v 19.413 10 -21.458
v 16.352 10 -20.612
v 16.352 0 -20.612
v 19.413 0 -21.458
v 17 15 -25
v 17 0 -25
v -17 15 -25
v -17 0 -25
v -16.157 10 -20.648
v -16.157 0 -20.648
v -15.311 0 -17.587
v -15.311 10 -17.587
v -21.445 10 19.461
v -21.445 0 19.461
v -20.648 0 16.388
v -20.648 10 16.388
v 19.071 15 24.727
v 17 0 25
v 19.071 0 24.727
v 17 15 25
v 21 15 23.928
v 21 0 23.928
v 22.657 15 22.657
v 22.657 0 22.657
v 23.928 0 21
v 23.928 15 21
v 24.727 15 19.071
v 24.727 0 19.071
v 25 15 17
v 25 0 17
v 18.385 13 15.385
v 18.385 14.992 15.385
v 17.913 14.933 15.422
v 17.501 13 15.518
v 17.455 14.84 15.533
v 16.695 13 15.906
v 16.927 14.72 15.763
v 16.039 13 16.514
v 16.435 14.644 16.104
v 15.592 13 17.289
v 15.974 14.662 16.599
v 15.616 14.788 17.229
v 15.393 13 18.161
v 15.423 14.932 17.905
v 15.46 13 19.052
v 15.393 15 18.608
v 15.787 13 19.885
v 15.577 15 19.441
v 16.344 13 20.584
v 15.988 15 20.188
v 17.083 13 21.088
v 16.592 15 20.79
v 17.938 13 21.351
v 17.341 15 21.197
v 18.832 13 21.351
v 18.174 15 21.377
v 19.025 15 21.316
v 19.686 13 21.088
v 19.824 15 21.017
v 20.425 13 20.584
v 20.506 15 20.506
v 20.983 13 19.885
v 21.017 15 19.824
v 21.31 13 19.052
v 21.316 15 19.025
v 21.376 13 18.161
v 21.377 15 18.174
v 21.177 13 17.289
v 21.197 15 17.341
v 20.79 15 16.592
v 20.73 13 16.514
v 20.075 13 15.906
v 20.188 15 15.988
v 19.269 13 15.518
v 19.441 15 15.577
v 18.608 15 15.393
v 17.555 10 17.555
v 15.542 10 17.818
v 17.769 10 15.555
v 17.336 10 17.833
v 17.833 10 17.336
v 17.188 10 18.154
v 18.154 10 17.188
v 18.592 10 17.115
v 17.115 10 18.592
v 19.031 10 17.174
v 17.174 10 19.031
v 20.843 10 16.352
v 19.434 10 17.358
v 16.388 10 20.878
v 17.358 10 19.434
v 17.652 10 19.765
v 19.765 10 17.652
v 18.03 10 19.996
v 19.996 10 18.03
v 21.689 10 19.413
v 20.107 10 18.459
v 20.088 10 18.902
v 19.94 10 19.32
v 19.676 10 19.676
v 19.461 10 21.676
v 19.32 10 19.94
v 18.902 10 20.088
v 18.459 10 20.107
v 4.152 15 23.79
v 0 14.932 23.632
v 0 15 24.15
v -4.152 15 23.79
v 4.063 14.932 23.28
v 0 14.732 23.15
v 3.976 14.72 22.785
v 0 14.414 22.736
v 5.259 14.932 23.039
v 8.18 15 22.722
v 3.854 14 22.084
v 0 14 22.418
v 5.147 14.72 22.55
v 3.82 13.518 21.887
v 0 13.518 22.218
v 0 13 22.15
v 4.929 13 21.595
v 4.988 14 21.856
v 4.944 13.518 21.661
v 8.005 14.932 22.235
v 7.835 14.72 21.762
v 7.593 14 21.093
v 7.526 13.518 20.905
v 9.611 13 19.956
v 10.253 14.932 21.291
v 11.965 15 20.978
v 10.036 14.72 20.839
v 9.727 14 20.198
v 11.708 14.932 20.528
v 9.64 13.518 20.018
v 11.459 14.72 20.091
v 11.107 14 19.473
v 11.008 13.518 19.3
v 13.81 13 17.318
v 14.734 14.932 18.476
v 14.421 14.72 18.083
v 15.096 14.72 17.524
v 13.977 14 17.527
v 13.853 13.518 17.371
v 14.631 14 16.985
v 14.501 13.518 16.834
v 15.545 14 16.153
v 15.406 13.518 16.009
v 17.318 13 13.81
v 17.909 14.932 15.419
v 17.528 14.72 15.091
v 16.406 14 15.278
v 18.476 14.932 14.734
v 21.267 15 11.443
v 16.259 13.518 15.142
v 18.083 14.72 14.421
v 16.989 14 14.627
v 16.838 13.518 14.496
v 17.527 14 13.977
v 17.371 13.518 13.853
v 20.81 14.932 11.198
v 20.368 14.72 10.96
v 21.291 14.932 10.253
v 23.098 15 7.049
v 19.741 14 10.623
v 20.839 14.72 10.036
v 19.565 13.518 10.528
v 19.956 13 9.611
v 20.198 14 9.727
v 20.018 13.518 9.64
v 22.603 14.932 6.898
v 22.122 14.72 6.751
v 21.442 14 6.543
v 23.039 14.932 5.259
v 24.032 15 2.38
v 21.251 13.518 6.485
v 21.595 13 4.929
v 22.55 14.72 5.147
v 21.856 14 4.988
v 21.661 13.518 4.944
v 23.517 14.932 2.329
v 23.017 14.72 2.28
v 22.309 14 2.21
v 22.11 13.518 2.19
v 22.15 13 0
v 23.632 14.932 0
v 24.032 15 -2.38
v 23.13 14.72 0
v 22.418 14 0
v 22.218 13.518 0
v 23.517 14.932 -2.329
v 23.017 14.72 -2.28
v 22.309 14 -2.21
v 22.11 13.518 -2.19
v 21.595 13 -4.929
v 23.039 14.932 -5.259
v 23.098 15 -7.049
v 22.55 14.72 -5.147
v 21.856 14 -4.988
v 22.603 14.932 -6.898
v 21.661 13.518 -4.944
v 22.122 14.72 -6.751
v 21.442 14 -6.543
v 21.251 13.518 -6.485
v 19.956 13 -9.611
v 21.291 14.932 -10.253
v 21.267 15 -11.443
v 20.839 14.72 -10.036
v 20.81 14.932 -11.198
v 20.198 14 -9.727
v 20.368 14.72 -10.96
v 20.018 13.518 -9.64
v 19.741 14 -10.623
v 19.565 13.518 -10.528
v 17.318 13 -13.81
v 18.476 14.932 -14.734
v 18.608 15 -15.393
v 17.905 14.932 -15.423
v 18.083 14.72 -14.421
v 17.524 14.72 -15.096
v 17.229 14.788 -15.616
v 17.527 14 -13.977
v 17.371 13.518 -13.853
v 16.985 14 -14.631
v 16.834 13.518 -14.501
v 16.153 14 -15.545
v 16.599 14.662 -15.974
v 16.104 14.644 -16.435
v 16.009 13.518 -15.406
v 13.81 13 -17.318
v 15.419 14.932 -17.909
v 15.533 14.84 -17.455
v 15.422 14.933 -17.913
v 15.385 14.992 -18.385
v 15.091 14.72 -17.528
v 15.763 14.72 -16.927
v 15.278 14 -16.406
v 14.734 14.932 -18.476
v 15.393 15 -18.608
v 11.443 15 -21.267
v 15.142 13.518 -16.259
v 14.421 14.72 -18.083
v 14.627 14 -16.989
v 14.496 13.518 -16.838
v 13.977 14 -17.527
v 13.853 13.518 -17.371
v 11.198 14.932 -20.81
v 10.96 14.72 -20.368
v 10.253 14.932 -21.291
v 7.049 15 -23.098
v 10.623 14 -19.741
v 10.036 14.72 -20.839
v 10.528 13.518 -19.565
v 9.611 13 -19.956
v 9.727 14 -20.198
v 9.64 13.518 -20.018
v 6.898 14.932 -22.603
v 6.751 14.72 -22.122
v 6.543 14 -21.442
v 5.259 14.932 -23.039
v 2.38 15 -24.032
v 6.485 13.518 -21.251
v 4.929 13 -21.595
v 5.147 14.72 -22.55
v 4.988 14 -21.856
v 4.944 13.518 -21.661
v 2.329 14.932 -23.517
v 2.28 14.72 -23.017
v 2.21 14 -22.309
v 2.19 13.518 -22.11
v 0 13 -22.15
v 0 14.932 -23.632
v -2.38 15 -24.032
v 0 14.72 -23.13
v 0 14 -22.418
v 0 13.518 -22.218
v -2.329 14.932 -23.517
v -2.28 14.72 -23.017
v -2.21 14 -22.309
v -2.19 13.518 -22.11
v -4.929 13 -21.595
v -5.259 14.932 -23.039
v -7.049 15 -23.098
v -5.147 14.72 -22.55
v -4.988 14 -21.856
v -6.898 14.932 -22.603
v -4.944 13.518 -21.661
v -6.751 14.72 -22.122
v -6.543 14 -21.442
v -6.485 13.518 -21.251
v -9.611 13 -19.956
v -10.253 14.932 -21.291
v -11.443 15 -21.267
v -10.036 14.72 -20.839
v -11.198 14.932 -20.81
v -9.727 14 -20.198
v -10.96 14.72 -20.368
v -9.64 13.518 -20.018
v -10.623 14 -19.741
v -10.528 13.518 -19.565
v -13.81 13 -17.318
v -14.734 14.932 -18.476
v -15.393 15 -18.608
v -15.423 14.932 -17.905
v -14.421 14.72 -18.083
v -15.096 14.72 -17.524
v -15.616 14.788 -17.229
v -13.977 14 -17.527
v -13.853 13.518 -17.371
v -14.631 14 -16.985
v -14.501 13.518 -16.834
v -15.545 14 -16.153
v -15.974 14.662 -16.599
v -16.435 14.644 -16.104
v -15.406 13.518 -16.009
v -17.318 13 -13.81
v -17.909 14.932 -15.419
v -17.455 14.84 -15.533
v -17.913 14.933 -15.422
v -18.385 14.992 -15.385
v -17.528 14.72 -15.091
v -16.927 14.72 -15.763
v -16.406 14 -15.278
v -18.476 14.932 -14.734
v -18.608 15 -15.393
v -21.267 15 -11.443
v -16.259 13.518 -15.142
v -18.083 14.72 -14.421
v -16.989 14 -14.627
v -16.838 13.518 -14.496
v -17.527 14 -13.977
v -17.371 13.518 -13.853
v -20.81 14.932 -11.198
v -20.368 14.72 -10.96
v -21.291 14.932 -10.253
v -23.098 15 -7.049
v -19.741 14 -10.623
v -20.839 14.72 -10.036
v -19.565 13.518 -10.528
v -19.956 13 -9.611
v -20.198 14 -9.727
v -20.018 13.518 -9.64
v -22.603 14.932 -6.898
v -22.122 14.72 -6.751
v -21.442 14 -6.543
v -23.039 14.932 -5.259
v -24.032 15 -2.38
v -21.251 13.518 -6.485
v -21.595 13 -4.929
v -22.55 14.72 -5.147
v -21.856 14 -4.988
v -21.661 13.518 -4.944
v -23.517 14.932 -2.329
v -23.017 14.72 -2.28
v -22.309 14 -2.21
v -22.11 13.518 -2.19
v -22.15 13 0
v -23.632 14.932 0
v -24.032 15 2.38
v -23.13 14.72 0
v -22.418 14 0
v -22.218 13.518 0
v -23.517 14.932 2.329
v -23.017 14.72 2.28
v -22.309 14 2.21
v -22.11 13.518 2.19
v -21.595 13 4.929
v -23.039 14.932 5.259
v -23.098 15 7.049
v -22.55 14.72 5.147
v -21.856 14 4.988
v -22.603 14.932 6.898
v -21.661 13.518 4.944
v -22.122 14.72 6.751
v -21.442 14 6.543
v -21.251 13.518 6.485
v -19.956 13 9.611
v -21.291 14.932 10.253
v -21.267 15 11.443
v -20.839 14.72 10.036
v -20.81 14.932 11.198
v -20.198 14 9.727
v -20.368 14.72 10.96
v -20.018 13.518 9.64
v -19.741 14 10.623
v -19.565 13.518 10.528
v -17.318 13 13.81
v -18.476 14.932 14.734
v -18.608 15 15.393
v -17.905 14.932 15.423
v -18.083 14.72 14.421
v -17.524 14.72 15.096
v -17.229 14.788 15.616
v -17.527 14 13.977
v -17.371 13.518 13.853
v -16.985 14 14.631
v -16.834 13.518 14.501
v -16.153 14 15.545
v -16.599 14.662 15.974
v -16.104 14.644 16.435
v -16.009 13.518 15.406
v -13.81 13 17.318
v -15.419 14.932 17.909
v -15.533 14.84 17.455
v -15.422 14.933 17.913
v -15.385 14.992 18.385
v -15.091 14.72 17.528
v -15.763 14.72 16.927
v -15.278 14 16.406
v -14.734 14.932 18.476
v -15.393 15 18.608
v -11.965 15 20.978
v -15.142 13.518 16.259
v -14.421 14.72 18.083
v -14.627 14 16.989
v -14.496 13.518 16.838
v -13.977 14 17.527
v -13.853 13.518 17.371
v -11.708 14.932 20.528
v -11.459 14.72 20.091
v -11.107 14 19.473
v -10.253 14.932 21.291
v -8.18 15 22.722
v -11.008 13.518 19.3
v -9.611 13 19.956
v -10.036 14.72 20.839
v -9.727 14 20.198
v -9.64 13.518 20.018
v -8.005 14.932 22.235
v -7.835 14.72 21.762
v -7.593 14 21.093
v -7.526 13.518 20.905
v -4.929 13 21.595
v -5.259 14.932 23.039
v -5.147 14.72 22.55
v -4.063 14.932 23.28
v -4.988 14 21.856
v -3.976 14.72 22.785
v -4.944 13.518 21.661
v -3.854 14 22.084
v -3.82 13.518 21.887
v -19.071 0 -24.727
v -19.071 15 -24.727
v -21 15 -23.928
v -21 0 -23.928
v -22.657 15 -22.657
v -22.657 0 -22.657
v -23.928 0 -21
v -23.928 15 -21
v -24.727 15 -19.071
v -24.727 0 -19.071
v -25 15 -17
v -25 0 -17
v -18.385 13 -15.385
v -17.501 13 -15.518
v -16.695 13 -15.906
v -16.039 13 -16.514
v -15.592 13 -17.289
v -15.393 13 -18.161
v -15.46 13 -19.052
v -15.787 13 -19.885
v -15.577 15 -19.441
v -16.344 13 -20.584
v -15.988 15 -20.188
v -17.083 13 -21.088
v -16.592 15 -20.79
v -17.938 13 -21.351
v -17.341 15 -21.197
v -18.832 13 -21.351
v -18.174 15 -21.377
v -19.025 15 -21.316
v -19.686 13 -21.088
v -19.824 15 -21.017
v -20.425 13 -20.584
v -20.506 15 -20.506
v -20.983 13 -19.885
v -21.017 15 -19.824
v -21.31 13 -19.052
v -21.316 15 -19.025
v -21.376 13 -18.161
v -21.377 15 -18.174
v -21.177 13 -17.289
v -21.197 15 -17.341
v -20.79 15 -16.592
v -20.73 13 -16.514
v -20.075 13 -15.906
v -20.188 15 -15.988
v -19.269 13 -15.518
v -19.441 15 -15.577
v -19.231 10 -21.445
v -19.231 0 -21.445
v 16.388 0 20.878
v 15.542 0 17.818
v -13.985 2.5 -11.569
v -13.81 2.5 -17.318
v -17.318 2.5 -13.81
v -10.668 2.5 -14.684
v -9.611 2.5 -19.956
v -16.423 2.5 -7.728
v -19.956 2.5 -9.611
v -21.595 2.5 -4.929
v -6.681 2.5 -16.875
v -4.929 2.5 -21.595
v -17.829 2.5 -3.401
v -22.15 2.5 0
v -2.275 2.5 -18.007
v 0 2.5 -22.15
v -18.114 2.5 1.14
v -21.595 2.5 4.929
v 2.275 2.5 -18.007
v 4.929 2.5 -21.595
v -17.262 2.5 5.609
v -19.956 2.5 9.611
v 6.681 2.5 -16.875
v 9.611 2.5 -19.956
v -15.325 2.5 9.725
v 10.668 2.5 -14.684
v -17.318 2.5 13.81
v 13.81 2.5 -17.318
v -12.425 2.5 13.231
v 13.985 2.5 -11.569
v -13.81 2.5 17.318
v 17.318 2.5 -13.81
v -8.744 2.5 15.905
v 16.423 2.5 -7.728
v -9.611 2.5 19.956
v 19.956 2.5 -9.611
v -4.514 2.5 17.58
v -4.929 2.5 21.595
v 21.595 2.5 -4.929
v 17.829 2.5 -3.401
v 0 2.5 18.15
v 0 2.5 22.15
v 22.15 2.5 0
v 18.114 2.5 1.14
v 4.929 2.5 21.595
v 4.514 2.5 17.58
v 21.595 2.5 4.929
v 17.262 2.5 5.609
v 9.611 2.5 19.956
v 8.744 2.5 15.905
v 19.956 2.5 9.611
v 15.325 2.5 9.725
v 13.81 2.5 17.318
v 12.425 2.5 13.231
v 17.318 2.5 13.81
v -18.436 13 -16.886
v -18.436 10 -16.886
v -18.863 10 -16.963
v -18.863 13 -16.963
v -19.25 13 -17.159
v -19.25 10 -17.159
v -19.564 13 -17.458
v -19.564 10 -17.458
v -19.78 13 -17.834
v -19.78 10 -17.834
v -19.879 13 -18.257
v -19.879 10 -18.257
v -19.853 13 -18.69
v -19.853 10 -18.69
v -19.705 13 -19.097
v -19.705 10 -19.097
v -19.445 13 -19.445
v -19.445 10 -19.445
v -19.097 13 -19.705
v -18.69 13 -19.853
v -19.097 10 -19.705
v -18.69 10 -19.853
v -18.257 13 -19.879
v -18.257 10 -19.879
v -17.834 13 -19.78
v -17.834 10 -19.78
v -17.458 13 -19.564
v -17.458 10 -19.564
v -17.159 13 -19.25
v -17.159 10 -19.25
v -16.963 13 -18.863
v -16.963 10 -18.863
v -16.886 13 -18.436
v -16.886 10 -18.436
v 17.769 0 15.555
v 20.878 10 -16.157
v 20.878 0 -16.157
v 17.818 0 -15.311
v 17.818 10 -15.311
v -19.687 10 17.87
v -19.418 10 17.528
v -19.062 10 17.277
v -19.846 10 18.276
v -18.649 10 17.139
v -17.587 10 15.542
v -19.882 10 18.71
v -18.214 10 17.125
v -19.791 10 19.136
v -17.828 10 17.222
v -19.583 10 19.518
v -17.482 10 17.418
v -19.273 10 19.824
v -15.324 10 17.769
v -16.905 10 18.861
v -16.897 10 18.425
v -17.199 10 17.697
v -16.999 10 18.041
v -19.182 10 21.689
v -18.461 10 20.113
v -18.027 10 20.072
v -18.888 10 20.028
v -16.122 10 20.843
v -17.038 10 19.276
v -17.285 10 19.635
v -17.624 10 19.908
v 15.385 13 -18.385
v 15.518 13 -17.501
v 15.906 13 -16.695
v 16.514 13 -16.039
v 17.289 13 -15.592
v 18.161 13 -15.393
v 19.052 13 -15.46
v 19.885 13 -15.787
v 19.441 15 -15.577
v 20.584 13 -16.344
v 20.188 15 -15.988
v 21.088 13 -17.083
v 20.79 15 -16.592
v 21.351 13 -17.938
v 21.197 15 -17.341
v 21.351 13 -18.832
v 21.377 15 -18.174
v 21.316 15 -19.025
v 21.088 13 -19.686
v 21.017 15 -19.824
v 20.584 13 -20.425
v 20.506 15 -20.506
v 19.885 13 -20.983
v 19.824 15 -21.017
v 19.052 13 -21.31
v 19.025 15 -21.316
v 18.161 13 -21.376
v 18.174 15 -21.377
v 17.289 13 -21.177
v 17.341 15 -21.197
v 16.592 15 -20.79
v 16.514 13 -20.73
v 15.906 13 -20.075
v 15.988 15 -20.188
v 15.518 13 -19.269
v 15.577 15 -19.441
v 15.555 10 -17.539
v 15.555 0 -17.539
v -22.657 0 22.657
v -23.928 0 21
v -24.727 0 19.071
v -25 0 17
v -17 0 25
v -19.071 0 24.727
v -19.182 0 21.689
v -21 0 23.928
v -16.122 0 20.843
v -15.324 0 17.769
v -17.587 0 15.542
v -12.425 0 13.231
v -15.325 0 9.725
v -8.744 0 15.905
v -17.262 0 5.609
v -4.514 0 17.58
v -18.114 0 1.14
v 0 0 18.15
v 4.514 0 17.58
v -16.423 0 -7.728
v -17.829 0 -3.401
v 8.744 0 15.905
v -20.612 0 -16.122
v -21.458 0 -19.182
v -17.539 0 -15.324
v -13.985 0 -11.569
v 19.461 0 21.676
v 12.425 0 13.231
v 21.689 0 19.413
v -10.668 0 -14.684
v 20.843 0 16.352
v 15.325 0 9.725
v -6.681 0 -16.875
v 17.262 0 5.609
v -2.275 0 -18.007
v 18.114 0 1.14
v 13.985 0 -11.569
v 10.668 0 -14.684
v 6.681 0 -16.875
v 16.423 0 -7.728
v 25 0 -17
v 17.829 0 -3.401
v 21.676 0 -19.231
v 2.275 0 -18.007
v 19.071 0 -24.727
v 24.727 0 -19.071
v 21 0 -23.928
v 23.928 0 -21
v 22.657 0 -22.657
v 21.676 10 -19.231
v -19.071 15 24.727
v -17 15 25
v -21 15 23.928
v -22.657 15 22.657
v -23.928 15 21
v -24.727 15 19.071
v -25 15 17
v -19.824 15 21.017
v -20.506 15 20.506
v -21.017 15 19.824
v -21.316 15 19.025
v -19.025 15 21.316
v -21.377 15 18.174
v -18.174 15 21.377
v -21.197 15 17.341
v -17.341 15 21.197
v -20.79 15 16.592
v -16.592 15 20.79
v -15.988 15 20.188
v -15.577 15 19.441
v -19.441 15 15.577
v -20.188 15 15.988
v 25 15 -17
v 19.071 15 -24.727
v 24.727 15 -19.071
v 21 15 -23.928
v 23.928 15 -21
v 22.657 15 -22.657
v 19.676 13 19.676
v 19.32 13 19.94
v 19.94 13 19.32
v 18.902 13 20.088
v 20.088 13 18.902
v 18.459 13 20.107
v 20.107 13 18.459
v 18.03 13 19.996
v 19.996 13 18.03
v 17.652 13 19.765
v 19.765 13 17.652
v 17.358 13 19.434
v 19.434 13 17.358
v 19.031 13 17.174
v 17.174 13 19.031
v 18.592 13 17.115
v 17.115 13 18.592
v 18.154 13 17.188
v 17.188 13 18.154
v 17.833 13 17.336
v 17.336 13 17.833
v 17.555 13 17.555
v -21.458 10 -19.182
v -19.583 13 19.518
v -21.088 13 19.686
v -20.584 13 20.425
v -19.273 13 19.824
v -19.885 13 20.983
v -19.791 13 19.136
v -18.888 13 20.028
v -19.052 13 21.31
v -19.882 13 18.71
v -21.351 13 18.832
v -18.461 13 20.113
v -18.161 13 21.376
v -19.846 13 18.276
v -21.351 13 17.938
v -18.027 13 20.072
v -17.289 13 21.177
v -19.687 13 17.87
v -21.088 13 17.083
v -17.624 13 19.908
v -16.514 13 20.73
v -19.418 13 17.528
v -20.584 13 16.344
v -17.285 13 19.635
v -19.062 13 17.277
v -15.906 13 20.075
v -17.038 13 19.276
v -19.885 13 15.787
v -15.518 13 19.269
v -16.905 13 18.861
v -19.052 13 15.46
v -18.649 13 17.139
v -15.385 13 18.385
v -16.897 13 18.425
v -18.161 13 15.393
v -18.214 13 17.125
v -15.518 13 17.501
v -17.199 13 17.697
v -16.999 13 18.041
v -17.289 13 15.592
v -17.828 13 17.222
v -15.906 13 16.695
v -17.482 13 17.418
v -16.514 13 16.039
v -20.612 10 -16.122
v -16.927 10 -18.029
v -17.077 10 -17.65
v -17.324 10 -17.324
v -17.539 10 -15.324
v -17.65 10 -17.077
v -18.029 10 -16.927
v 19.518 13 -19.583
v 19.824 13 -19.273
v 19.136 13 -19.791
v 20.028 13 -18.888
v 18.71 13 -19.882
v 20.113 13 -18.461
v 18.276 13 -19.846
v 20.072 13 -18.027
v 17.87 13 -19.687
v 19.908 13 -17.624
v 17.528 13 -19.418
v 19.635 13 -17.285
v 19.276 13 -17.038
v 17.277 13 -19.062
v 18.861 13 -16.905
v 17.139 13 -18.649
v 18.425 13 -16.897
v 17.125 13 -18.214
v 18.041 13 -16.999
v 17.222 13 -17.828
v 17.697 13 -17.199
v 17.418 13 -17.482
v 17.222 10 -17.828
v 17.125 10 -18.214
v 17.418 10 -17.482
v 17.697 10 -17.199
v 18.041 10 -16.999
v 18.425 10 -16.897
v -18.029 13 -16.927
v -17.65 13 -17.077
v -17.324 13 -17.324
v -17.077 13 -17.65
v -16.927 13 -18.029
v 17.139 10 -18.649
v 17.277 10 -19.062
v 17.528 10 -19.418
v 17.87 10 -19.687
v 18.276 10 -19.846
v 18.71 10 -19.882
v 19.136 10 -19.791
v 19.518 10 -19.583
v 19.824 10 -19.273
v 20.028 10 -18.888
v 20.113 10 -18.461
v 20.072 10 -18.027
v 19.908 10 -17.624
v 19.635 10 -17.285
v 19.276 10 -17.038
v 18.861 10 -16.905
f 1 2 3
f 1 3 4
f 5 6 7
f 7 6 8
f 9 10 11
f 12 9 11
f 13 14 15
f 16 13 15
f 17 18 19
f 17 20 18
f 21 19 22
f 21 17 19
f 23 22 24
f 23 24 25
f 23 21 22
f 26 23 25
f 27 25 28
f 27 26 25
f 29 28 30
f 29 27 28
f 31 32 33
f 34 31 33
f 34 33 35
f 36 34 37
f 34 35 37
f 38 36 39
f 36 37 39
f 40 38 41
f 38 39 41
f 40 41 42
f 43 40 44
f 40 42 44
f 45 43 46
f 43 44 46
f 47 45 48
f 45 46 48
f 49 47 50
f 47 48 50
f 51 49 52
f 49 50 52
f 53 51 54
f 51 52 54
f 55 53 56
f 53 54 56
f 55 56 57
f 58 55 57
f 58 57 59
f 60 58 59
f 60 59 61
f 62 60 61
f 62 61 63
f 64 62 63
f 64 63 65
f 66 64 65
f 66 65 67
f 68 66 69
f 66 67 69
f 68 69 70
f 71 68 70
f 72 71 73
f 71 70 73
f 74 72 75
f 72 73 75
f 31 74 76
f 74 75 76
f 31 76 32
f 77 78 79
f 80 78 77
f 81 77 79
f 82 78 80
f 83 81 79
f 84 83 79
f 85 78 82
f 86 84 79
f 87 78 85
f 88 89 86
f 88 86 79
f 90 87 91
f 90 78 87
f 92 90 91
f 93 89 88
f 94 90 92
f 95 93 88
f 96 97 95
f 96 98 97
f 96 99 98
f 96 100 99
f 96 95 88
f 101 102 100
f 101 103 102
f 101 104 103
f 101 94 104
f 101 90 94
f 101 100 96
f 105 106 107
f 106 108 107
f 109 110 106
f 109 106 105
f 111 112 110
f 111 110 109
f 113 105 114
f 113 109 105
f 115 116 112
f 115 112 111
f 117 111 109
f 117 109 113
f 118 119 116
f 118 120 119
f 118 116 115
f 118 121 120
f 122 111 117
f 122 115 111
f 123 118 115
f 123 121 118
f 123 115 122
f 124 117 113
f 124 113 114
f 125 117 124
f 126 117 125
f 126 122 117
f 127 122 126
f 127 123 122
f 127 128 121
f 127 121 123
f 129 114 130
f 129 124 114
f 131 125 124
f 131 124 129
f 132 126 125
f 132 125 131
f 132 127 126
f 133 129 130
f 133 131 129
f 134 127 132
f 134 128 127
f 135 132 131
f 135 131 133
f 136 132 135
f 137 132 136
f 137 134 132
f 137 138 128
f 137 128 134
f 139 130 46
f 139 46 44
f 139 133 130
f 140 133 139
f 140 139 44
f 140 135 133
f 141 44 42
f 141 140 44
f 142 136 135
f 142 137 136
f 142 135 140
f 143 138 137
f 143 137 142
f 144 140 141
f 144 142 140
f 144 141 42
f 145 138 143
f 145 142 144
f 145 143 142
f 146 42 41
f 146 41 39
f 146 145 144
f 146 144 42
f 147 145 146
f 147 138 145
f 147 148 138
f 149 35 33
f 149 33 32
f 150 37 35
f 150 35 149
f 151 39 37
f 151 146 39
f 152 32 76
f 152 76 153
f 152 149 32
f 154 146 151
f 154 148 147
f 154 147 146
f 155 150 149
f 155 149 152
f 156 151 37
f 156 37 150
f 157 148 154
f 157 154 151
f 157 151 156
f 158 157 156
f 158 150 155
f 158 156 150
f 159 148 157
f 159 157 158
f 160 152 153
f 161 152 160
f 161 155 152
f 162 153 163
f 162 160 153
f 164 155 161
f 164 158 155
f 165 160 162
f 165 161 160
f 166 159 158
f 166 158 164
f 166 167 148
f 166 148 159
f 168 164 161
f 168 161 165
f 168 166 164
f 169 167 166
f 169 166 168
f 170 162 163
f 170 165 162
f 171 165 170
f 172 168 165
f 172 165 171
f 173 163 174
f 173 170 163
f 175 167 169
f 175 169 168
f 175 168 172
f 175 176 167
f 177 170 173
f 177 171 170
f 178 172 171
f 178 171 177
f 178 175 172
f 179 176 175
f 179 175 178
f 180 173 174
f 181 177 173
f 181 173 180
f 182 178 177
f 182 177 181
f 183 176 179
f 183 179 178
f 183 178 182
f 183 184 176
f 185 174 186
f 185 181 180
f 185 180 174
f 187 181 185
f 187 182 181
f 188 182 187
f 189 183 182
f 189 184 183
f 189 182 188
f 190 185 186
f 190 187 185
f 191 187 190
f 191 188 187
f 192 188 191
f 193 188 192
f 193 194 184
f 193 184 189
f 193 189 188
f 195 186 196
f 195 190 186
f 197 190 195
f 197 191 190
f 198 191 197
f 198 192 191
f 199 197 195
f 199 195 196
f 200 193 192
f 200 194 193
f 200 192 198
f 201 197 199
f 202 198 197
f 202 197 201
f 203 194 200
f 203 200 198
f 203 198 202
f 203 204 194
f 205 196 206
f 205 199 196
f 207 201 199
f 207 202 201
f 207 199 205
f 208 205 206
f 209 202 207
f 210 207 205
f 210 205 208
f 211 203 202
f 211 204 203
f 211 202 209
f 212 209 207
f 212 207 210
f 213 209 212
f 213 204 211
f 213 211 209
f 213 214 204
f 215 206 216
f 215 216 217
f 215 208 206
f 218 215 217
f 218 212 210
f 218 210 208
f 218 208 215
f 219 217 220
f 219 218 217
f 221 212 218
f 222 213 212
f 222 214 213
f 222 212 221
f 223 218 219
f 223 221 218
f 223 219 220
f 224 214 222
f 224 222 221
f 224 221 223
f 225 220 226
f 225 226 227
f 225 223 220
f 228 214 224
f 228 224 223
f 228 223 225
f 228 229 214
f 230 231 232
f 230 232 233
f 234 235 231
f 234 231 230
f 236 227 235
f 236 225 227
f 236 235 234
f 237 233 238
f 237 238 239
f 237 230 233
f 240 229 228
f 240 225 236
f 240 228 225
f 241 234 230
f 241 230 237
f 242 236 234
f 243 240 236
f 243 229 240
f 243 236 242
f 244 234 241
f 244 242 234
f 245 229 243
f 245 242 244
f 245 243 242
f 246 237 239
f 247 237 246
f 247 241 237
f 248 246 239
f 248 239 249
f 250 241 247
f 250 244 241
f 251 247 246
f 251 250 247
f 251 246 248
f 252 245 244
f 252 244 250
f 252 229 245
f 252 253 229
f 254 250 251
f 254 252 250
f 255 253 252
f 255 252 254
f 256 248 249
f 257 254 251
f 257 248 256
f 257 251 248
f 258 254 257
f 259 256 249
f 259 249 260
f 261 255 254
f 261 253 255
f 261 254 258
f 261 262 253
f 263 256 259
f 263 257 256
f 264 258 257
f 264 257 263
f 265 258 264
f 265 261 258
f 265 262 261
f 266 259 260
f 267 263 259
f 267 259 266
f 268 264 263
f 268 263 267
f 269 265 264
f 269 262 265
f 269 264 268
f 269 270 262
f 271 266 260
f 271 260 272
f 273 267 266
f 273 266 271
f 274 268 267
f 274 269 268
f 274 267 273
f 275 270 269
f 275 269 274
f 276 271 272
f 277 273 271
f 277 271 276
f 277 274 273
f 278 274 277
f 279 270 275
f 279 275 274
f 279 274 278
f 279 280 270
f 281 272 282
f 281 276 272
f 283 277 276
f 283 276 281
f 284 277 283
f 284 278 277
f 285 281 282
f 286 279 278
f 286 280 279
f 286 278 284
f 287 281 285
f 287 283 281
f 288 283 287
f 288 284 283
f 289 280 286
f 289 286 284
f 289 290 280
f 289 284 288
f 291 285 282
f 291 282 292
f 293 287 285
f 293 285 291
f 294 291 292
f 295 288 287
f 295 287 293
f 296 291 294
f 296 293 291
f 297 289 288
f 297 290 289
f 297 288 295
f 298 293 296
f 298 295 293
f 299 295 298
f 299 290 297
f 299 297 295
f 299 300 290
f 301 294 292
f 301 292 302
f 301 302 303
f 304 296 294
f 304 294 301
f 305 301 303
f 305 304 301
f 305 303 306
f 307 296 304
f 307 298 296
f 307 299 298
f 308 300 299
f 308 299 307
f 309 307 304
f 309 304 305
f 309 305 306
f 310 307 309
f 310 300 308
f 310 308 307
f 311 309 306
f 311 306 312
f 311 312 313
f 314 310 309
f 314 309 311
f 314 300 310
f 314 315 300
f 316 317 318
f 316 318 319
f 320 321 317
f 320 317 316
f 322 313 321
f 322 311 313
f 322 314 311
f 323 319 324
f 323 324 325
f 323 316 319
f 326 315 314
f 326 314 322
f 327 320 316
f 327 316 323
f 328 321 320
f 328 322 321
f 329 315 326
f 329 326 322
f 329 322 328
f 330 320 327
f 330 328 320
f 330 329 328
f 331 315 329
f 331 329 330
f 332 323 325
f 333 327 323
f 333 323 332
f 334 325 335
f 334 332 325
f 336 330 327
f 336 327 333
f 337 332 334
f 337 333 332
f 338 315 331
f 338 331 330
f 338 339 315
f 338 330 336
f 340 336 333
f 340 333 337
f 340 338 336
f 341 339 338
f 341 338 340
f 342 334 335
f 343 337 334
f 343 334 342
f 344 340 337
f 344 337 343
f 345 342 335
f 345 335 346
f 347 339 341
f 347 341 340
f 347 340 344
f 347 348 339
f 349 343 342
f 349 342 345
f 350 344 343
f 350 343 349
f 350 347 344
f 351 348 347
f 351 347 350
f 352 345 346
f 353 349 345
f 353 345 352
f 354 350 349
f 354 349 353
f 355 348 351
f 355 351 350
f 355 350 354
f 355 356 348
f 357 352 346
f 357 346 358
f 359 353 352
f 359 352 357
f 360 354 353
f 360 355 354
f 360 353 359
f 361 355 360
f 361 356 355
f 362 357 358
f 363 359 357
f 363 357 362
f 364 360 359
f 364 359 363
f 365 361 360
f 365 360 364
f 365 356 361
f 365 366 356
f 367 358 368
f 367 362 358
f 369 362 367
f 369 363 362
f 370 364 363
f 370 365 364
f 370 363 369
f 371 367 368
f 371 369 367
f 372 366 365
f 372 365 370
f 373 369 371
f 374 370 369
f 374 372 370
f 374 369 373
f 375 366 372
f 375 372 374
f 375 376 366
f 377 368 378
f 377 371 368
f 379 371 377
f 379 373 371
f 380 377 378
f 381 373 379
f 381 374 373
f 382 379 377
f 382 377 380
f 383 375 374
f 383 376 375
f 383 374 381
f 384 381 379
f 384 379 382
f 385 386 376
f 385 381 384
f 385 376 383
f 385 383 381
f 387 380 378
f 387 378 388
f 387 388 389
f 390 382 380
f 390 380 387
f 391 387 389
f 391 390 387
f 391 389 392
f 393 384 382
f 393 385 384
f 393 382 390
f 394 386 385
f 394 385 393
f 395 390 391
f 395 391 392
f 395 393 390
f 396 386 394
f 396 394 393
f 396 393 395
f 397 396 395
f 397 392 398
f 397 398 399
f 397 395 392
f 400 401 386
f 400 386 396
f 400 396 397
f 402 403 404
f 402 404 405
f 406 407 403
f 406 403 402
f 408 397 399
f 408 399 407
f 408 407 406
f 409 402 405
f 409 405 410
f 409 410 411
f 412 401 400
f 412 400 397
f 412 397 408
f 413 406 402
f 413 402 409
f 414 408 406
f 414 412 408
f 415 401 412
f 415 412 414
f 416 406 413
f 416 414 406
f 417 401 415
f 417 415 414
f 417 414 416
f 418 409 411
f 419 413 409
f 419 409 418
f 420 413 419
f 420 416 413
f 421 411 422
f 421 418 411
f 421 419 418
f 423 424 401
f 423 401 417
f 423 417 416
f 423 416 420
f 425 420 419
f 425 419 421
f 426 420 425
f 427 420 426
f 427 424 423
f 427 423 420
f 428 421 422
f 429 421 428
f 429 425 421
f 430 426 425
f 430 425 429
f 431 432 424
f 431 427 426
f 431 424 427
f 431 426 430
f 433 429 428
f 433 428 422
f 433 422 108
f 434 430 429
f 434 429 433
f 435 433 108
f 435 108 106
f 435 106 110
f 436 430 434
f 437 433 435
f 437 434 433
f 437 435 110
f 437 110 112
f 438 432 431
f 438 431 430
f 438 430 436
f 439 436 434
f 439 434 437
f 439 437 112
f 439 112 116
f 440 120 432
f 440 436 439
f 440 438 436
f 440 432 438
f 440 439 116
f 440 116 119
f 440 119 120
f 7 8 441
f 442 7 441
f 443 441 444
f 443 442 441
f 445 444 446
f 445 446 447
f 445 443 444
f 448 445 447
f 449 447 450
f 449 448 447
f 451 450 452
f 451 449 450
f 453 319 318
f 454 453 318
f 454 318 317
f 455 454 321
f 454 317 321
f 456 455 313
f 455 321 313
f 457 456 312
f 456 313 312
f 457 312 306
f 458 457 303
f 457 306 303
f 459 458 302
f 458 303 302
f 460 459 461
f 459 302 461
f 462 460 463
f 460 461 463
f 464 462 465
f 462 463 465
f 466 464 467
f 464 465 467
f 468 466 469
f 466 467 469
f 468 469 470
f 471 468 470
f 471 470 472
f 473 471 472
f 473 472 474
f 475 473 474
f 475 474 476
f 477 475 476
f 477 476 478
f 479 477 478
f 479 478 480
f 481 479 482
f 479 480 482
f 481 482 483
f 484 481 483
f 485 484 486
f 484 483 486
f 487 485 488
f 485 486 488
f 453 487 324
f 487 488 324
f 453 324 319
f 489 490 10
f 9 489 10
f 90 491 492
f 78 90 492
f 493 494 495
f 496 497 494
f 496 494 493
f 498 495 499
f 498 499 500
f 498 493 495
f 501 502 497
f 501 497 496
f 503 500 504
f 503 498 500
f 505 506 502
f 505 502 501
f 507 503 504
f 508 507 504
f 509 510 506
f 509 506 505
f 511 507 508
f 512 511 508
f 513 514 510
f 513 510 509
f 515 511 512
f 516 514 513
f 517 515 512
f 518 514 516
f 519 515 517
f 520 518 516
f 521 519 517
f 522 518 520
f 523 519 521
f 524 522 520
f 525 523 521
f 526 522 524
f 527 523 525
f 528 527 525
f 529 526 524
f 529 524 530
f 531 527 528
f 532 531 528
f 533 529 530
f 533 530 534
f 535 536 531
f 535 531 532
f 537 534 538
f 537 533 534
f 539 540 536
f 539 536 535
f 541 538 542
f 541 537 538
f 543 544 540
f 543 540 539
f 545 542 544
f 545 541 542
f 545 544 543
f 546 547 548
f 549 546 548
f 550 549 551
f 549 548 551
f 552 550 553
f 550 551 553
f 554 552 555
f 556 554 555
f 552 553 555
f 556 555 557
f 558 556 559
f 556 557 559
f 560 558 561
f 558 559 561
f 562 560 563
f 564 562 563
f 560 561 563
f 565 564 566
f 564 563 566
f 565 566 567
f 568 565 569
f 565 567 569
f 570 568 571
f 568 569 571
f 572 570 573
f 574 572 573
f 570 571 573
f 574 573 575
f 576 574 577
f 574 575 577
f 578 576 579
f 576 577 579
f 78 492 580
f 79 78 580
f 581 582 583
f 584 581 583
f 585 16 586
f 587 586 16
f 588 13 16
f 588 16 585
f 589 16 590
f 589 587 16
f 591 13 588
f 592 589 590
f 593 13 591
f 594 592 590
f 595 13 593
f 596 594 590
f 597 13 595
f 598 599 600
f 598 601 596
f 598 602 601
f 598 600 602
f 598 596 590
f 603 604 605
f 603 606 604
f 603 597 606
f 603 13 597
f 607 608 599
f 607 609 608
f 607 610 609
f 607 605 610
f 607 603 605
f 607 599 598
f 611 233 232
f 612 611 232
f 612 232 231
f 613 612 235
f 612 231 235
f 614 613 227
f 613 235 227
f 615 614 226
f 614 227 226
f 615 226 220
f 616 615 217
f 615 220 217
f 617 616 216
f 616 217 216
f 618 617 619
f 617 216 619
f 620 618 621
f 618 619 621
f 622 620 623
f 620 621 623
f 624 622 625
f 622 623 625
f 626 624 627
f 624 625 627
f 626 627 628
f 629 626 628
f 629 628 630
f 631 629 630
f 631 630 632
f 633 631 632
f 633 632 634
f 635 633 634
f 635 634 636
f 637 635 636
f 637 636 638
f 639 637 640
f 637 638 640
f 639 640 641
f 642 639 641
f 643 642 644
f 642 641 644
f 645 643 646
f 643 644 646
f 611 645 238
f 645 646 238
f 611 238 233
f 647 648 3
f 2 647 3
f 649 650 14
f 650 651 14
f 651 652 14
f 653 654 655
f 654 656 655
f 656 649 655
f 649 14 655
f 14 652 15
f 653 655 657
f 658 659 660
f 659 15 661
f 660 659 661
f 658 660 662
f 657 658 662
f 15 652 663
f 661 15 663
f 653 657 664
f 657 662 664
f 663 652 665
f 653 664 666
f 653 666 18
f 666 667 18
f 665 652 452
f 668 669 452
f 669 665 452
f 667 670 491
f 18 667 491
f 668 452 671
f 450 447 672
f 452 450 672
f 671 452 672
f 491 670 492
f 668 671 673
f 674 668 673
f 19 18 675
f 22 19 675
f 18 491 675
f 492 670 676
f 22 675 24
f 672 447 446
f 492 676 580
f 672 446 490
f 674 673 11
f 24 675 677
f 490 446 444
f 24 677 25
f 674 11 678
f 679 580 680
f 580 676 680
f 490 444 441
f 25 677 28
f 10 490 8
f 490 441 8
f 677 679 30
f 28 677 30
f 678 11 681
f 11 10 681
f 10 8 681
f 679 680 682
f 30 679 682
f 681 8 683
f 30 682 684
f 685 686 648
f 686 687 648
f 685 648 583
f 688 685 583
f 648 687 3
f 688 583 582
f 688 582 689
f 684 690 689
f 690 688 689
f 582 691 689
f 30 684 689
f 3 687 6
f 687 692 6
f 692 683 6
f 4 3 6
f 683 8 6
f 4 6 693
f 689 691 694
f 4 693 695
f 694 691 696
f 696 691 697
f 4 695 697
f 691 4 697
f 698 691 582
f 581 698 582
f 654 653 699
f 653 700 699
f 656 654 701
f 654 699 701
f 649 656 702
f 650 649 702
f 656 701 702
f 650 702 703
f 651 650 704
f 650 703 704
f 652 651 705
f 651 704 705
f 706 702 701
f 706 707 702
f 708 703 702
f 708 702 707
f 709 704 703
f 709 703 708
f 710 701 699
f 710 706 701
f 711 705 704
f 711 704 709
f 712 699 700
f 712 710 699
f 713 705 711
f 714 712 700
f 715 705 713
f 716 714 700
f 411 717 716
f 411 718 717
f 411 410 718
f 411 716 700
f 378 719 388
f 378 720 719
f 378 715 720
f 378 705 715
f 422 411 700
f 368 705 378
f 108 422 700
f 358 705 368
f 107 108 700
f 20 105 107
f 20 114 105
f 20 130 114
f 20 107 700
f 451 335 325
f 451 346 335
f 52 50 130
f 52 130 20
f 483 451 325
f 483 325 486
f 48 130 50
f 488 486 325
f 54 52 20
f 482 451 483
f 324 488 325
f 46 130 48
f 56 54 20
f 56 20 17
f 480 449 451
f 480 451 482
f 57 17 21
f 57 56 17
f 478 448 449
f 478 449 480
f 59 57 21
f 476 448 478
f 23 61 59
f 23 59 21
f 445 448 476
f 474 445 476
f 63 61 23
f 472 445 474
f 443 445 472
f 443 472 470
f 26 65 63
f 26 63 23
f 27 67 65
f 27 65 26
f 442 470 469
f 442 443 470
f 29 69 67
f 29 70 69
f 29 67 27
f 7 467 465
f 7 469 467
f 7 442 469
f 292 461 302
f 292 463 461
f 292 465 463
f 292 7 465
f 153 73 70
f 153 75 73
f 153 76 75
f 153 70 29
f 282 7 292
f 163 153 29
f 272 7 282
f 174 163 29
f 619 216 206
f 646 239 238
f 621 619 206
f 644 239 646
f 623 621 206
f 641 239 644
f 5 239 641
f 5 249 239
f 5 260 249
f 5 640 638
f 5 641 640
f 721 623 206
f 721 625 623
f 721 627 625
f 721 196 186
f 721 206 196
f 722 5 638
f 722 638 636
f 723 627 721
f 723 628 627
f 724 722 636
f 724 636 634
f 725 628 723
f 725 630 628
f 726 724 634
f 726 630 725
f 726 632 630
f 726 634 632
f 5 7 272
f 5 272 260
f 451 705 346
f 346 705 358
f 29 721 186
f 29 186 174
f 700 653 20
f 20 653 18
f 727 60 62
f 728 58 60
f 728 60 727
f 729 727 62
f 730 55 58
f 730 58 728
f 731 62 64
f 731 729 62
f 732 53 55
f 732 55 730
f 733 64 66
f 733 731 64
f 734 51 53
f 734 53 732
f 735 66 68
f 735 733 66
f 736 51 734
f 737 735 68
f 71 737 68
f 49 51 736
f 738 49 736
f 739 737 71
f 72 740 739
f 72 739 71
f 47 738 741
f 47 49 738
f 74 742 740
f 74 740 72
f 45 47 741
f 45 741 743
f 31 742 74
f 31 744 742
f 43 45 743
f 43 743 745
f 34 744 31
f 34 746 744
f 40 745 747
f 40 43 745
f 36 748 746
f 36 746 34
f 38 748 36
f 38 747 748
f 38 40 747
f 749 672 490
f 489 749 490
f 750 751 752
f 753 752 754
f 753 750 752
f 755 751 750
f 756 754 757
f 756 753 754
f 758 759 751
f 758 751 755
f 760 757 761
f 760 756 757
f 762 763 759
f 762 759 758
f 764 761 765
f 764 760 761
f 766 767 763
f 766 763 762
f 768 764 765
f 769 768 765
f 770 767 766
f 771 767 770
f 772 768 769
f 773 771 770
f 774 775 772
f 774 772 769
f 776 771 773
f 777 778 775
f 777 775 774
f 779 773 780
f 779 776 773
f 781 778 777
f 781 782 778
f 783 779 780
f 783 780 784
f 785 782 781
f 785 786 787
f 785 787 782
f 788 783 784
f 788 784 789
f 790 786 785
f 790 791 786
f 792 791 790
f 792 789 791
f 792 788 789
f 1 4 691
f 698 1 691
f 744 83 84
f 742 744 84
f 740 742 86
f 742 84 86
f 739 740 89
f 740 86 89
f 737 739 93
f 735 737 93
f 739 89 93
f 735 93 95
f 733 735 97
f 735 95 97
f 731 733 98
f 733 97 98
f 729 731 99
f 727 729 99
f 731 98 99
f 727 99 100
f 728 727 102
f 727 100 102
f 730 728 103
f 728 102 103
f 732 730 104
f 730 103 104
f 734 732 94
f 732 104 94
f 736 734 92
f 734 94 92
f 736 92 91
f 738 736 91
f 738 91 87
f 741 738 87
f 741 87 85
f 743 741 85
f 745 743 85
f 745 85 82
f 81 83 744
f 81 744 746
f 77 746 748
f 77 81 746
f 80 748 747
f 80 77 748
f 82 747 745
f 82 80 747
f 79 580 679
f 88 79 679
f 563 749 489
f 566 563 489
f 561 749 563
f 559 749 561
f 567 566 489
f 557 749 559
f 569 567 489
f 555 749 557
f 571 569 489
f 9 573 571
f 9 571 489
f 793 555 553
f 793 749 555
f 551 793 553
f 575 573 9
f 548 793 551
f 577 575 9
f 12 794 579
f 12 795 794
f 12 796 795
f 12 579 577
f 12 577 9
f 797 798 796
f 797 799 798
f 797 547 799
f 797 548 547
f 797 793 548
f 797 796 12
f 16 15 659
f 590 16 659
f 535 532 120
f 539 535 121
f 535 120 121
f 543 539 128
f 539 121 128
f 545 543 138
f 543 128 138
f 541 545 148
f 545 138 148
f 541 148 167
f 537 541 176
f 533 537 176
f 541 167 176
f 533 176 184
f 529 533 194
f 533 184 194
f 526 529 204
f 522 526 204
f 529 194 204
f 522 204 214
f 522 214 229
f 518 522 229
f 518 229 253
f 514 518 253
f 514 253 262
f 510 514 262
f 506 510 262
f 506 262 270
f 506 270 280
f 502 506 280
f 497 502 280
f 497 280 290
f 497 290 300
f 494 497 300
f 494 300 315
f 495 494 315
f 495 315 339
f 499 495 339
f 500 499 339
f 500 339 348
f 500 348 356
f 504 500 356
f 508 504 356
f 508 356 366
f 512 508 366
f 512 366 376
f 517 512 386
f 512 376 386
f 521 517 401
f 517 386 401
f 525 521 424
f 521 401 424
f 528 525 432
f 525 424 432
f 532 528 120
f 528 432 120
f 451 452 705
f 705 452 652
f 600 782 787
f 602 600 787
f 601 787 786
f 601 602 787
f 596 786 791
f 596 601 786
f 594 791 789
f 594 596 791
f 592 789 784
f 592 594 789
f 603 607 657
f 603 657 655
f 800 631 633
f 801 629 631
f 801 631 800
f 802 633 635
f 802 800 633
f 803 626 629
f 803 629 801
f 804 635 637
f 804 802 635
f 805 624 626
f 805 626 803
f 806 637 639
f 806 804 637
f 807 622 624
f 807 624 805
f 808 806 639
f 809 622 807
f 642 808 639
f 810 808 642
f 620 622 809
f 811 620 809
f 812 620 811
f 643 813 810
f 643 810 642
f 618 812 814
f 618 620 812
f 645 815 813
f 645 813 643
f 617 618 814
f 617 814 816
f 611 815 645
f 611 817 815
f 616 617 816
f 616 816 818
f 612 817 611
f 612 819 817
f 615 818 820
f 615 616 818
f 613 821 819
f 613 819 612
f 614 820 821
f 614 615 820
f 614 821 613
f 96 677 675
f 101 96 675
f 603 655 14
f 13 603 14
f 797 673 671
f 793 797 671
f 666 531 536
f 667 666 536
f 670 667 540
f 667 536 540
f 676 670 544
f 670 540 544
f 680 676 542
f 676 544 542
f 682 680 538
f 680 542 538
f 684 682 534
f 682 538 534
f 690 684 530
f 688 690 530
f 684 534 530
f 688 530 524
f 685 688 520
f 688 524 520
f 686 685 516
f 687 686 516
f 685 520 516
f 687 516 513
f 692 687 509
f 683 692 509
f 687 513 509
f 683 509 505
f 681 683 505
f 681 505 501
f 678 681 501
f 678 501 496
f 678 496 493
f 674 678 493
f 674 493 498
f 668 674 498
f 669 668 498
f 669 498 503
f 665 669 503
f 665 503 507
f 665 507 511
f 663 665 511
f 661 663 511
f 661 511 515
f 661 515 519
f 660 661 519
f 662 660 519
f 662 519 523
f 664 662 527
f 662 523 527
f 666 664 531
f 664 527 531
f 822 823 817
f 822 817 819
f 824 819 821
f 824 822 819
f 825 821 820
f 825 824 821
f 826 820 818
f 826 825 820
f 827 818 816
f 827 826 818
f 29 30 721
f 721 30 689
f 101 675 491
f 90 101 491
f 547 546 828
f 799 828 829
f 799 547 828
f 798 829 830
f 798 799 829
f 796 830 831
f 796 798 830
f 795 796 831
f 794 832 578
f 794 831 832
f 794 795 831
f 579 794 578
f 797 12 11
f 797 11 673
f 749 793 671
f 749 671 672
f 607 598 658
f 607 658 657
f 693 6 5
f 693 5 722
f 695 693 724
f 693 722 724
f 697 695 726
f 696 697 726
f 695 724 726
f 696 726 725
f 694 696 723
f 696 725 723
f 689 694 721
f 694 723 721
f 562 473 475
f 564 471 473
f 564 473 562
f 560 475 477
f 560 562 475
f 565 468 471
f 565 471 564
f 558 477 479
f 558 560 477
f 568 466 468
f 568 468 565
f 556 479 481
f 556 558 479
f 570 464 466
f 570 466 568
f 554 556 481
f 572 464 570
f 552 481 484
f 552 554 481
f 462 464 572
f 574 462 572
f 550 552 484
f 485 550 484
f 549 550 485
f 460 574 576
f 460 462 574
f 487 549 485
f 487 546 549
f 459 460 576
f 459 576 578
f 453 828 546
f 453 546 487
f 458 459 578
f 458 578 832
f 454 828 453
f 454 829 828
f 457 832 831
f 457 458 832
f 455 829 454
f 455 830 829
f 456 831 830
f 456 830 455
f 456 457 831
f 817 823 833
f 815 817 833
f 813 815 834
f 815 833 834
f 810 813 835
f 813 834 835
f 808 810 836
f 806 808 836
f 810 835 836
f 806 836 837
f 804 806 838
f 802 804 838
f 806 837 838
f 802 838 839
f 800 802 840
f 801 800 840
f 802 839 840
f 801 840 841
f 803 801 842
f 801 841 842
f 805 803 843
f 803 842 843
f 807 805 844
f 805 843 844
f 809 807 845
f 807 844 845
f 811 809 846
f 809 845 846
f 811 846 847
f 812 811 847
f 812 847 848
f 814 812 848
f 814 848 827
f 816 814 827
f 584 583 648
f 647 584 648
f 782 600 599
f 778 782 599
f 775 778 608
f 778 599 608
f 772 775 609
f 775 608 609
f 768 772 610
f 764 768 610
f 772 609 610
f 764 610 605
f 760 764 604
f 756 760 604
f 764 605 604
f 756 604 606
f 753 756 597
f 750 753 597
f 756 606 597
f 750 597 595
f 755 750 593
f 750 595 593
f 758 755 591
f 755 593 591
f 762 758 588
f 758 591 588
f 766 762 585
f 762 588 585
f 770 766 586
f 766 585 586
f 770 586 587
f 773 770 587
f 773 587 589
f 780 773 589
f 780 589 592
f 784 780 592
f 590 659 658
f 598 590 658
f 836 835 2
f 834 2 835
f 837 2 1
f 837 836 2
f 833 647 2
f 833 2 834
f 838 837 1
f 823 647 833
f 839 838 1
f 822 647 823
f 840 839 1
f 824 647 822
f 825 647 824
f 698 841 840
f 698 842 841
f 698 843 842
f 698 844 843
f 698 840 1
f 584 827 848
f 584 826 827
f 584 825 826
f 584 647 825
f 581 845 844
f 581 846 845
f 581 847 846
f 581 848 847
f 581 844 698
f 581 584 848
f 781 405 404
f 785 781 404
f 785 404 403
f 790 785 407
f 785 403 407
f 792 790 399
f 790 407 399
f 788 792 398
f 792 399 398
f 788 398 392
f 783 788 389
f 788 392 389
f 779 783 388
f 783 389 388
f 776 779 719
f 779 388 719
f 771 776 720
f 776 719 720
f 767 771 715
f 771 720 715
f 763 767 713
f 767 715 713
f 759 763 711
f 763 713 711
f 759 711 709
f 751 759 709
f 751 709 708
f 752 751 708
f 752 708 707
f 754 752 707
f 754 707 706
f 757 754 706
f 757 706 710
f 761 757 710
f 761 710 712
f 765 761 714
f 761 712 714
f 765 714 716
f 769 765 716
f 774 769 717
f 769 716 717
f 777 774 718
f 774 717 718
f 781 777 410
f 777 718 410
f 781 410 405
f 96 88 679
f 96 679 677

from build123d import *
from build123d.topology import SkipClean

# Parameters (mm, degrees)
SKETCH_1_R               = 25
EXTRUDE_1_DEPTH          = 15
SKETCH_2_R               = 22.15
CUT_EXTRUDE_1_DEPTH      = 12.5
SKETCH_3_R               = 18.15
CUT_EXTRUDE_2_DEPTH      = 12.5
EXTRUDE_2_DEPTH          = 15
FILLET_1_R               = 8
CUT_EXTRUDE_START        = -15
SKETCH_5_R               = 1.5
CUT_EXTRUDE_3_DEPTH      = 15
SKETCH_6_R               = 3
CUT_EXTRUDE_4_DEPTH      = 2
PATTERN_CIRCULAR_1_COUNT = 4
CUT_EXTRUDE_5_DEPTH      = 10
FILLET_2_R               = 2


with BuildPart() as part:
    # 草图1 → 凸台-拉伸1 (new body)
    with BuildSketch(Plane(origin=(0, 0, 0), x_dir=(1, 0, 0), z_dir=(0, 1, 0))):
        with Locations(Location((0, 0, 0), (0, 0, 270))):
            Circle(SKETCH_1_R)
    extrude(amount=EXTRUDE_1_DEPTH)

    # 草图2 → 切除-拉伸1 (cut)
    with BuildSketch(Plane(origin=(0, 15, 0), x_dir=(1, 0, 0), z_dir=(0, 1, 0))):
        with Locations(Location((0, 0, 0), (0, 0, 270))):
            Circle(SKETCH_2_R)
    extrude(amount=-CUT_EXTRUDE_1_DEPTH, mode=Mode.SUBTRACT)

    # 草图3 → 切除-拉伸2 (cut)
    with BuildSketch(Plane(origin=(0, 2.5, 0), x_dir=(1, 0, 0), z_dir=(0, 1, 0))):
        with Locations(Location((0, 0, 0), (0, 0, 270))):
            Circle(SKETCH_3_R)
    extrude(amount=-CUT_EXTRUDE_2_DEPTH, mode=Mode.SUBTRACT)

    # 草图4 → 凸台-拉伸2 (add)
    with BuildSketch(Plane(origin=(0, 0, 0), x_dir=(1, 0, 0), z_dir=(0, 1, 0))):
        with BuildLine():
            Line((0, 25), (-25, 25))
            Line((-25, 25), (-25, 2.6e-08))
            ThreePointArc((-25, 2.6e-08), (-23.301207713, 9.058350794), (-18.435702489, 16.885641052))
            ThreePointArc((-18.435702489, 16.885641052), (-19.445436483, 19.445436483), (-16.885641052, 18.435702489))
            ThreePointArc((-16.885641052, 18.435702489), (-9.058350782, 23.301207718), (0, 25))
        make_face()
        with BuildLine():
            Line((25, 25), (0, 25))
            ThreePointArc((0, 25), (9.210354363, 23.241544108), (17.125028574, 18.213549801))
            ThreePointArc((17.125028574, 18.213549801), (19.682469279, 19.438809921), (18.425448396, 16.896829626))
            ThreePointArc((18.425448396, 16.896829626), (23.298457137, 9.065423048), (25, 0))
            Line((25, 0), (25, 25))
        make_face()
        with BuildLine():
            ThreePointArc((-18.213549801, -17.125028574), (-23.241544113, -9.210354351), (-25, 2.6e-08))
            Line((-25, 2.6e-08), (-25, -25))
            Line((-25, -25), (-5.8e-08, -25))
            ThreePointArc((-5.8e-08, -25), (-9.065423076, -23.298457126), (-16.896829626, -18.425448396))
            ThreePointArc((-16.896829626, -18.425448396), (-19.438809921, -19.682469279), (-18.213549801, -17.125028574))
        make_face()
        with BuildLine():
            Line((25, -25), (25, 0))
            ThreePointArc((25, 0), (23.22561674, -9.250444694), (18.154341838, -17.18778265))
            ThreePointArc((18.154341838, -17.18778265), (19.675883861, -19.675883861), (17.18778265, -18.154341838))
            ThreePointArc((17.18778265, -18.154341838), (9.250444666, -23.225616751), (-5.8e-08, -25))
            Line((-5.8e-08, -25), (25, -25))
        make_face()
    extrude(amount=EXTRUDE_2_DEPTH)

    # 圆角1
    fillet_1_edges = [part.edges().sort_by_distance(p)[0] for p in [
        (-25, 7.5, -25),
        (25, 7.5, -25),
        (-25, 7.5, 25),
        (25, 7.5, 25),
    ]]
    fillet(fillet_1_edges, radius=FILLET_1_R)

    # 草图5 → 切除-拉伸3 (cut)
    with BuildSketch(Plane(origin=(0, 15, 0), x_dir=(1, 0, 0), z_dir=(0, 1, 0)).offset(CUT_EXTRUDE_START)):
        with Locations(Location((-18.384776311, 18.384776311, 0), (0, 0, 270))):
            Circle(SKETCH_5_R)
        with Locations(Location((18.615223689, 18.384776311, 0), (0, 0, 270))):
            Circle(SKETCH_5_R)
        with Locations(Location((18.615223689, -18.615223689, 0), (0, 0, 270))):
            Circle(SKETCH_5_R)
        with Locations(Location((-18.384776311, -18.615223689, 0), (0, 0, 270))):
            Circle(SKETCH_5_R)
    extrude(amount=CUT_EXTRUDE_3_DEPTH, mode=Mode.SUBTRACT)

    # 草图6 → 切除-拉伸4 (cut)
    with BuildSketch(Plane(origin=(0, 15, 0), x_dir=(1, 0, 0), z_dir=(0, 1, 0))):
        with Locations(Location((-18.384776311, 18.384776311, 0), (0, 0, 270))):
            Circle(SKETCH_6_R)
    cut_extrude_4 = extrude(amount=-CUT_EXTRUDE_4_DEPTH, mode=Mode.SUBTRACT)

    # 阵列(圆周)1: 切除-拉伸4 ×4 about axis
    with SkipClean():  # the faces are left unmerged after this step: merging them gives an invalid solid
        pattern_circular_1_axis = Axis((0, 0, 0), (0, 1, 0))
        for i in range(1, PATTERN_CIRCULAR_1_COUNT):
            add(cut_extrude_4.rotate(pattern_circular_1_axis, i * 360 / PATTERN_CIRCULAR_1_COUNT), mode=Mode.SUBTRACT)

    # 草图7 → 切除-拉伸5 (cut)
    with SkipClean():  # the faces are left unmerged after this step: merging them gives an invalid solid
        with BuildSketch(Plane.XZ):
            Polygon((15.541599538, 17.817622342), (17.769154642, 15.554586419), (20.842778794, 16.352187766), (21.688847841, 19.412825036), (19.461292736, 21.67586096), (16.387668585, 20.878259612), align=None)
            Polygon((-15.32413904, 17.769154642), (-16.121740388, 20.842778794), (-19.182377658, 21.688847841), (-21.445413581, 19.461292736), (-20.647812234, 16.387668585), (-17.587174964, 15.541599538), align=None)
            Polygon((17.817622342, -15.311152159), (15.554586419, -17.538707264), (16.352187766, -20.612331415), (19.412825036, -21.458400462), (21.67586096, -19.230845358), (20.878259612, -16.157221206), align=None)
            Polygon((-15.311152159, -17.587174964), (-17.538707264, -15.32413904), (-20.612331415, -16.121740388), (-21.458400462, -19.182377658), (-19.230845358, -21.445413581), (-16.157221206, -20.647812234), align=None)
        extrude(amount=-CUT_EXTRUDE_5_DEPTH, mode=Mode.SUBTRACT)

    # 圆角2
    # the kernel refuses this fillet: 2 mm, written as the material it takes off along each edge
    with BuildSketch(Plane(origin=(0, 15, 0), x_dir=(0, 0, 1), z_dir=(-1, 0, 0))) as fillet_2_piece_1:
        with BuildLine():
            CenterArc((22.15 + FILLET_2_R, -FILLET_2_R), FILLET_2_R, 90, 90)
            Line((22.15, -FILLET_2_R), (22.15, 0))
            Line((22.15, 0), (22.15 + FILLET_2_R, 0))
        make_face()
    revolve(axis=Axis((0, 15, 0), (0, 1, 0)), mode=Mode.SUBTRACT)


solid = part.part
